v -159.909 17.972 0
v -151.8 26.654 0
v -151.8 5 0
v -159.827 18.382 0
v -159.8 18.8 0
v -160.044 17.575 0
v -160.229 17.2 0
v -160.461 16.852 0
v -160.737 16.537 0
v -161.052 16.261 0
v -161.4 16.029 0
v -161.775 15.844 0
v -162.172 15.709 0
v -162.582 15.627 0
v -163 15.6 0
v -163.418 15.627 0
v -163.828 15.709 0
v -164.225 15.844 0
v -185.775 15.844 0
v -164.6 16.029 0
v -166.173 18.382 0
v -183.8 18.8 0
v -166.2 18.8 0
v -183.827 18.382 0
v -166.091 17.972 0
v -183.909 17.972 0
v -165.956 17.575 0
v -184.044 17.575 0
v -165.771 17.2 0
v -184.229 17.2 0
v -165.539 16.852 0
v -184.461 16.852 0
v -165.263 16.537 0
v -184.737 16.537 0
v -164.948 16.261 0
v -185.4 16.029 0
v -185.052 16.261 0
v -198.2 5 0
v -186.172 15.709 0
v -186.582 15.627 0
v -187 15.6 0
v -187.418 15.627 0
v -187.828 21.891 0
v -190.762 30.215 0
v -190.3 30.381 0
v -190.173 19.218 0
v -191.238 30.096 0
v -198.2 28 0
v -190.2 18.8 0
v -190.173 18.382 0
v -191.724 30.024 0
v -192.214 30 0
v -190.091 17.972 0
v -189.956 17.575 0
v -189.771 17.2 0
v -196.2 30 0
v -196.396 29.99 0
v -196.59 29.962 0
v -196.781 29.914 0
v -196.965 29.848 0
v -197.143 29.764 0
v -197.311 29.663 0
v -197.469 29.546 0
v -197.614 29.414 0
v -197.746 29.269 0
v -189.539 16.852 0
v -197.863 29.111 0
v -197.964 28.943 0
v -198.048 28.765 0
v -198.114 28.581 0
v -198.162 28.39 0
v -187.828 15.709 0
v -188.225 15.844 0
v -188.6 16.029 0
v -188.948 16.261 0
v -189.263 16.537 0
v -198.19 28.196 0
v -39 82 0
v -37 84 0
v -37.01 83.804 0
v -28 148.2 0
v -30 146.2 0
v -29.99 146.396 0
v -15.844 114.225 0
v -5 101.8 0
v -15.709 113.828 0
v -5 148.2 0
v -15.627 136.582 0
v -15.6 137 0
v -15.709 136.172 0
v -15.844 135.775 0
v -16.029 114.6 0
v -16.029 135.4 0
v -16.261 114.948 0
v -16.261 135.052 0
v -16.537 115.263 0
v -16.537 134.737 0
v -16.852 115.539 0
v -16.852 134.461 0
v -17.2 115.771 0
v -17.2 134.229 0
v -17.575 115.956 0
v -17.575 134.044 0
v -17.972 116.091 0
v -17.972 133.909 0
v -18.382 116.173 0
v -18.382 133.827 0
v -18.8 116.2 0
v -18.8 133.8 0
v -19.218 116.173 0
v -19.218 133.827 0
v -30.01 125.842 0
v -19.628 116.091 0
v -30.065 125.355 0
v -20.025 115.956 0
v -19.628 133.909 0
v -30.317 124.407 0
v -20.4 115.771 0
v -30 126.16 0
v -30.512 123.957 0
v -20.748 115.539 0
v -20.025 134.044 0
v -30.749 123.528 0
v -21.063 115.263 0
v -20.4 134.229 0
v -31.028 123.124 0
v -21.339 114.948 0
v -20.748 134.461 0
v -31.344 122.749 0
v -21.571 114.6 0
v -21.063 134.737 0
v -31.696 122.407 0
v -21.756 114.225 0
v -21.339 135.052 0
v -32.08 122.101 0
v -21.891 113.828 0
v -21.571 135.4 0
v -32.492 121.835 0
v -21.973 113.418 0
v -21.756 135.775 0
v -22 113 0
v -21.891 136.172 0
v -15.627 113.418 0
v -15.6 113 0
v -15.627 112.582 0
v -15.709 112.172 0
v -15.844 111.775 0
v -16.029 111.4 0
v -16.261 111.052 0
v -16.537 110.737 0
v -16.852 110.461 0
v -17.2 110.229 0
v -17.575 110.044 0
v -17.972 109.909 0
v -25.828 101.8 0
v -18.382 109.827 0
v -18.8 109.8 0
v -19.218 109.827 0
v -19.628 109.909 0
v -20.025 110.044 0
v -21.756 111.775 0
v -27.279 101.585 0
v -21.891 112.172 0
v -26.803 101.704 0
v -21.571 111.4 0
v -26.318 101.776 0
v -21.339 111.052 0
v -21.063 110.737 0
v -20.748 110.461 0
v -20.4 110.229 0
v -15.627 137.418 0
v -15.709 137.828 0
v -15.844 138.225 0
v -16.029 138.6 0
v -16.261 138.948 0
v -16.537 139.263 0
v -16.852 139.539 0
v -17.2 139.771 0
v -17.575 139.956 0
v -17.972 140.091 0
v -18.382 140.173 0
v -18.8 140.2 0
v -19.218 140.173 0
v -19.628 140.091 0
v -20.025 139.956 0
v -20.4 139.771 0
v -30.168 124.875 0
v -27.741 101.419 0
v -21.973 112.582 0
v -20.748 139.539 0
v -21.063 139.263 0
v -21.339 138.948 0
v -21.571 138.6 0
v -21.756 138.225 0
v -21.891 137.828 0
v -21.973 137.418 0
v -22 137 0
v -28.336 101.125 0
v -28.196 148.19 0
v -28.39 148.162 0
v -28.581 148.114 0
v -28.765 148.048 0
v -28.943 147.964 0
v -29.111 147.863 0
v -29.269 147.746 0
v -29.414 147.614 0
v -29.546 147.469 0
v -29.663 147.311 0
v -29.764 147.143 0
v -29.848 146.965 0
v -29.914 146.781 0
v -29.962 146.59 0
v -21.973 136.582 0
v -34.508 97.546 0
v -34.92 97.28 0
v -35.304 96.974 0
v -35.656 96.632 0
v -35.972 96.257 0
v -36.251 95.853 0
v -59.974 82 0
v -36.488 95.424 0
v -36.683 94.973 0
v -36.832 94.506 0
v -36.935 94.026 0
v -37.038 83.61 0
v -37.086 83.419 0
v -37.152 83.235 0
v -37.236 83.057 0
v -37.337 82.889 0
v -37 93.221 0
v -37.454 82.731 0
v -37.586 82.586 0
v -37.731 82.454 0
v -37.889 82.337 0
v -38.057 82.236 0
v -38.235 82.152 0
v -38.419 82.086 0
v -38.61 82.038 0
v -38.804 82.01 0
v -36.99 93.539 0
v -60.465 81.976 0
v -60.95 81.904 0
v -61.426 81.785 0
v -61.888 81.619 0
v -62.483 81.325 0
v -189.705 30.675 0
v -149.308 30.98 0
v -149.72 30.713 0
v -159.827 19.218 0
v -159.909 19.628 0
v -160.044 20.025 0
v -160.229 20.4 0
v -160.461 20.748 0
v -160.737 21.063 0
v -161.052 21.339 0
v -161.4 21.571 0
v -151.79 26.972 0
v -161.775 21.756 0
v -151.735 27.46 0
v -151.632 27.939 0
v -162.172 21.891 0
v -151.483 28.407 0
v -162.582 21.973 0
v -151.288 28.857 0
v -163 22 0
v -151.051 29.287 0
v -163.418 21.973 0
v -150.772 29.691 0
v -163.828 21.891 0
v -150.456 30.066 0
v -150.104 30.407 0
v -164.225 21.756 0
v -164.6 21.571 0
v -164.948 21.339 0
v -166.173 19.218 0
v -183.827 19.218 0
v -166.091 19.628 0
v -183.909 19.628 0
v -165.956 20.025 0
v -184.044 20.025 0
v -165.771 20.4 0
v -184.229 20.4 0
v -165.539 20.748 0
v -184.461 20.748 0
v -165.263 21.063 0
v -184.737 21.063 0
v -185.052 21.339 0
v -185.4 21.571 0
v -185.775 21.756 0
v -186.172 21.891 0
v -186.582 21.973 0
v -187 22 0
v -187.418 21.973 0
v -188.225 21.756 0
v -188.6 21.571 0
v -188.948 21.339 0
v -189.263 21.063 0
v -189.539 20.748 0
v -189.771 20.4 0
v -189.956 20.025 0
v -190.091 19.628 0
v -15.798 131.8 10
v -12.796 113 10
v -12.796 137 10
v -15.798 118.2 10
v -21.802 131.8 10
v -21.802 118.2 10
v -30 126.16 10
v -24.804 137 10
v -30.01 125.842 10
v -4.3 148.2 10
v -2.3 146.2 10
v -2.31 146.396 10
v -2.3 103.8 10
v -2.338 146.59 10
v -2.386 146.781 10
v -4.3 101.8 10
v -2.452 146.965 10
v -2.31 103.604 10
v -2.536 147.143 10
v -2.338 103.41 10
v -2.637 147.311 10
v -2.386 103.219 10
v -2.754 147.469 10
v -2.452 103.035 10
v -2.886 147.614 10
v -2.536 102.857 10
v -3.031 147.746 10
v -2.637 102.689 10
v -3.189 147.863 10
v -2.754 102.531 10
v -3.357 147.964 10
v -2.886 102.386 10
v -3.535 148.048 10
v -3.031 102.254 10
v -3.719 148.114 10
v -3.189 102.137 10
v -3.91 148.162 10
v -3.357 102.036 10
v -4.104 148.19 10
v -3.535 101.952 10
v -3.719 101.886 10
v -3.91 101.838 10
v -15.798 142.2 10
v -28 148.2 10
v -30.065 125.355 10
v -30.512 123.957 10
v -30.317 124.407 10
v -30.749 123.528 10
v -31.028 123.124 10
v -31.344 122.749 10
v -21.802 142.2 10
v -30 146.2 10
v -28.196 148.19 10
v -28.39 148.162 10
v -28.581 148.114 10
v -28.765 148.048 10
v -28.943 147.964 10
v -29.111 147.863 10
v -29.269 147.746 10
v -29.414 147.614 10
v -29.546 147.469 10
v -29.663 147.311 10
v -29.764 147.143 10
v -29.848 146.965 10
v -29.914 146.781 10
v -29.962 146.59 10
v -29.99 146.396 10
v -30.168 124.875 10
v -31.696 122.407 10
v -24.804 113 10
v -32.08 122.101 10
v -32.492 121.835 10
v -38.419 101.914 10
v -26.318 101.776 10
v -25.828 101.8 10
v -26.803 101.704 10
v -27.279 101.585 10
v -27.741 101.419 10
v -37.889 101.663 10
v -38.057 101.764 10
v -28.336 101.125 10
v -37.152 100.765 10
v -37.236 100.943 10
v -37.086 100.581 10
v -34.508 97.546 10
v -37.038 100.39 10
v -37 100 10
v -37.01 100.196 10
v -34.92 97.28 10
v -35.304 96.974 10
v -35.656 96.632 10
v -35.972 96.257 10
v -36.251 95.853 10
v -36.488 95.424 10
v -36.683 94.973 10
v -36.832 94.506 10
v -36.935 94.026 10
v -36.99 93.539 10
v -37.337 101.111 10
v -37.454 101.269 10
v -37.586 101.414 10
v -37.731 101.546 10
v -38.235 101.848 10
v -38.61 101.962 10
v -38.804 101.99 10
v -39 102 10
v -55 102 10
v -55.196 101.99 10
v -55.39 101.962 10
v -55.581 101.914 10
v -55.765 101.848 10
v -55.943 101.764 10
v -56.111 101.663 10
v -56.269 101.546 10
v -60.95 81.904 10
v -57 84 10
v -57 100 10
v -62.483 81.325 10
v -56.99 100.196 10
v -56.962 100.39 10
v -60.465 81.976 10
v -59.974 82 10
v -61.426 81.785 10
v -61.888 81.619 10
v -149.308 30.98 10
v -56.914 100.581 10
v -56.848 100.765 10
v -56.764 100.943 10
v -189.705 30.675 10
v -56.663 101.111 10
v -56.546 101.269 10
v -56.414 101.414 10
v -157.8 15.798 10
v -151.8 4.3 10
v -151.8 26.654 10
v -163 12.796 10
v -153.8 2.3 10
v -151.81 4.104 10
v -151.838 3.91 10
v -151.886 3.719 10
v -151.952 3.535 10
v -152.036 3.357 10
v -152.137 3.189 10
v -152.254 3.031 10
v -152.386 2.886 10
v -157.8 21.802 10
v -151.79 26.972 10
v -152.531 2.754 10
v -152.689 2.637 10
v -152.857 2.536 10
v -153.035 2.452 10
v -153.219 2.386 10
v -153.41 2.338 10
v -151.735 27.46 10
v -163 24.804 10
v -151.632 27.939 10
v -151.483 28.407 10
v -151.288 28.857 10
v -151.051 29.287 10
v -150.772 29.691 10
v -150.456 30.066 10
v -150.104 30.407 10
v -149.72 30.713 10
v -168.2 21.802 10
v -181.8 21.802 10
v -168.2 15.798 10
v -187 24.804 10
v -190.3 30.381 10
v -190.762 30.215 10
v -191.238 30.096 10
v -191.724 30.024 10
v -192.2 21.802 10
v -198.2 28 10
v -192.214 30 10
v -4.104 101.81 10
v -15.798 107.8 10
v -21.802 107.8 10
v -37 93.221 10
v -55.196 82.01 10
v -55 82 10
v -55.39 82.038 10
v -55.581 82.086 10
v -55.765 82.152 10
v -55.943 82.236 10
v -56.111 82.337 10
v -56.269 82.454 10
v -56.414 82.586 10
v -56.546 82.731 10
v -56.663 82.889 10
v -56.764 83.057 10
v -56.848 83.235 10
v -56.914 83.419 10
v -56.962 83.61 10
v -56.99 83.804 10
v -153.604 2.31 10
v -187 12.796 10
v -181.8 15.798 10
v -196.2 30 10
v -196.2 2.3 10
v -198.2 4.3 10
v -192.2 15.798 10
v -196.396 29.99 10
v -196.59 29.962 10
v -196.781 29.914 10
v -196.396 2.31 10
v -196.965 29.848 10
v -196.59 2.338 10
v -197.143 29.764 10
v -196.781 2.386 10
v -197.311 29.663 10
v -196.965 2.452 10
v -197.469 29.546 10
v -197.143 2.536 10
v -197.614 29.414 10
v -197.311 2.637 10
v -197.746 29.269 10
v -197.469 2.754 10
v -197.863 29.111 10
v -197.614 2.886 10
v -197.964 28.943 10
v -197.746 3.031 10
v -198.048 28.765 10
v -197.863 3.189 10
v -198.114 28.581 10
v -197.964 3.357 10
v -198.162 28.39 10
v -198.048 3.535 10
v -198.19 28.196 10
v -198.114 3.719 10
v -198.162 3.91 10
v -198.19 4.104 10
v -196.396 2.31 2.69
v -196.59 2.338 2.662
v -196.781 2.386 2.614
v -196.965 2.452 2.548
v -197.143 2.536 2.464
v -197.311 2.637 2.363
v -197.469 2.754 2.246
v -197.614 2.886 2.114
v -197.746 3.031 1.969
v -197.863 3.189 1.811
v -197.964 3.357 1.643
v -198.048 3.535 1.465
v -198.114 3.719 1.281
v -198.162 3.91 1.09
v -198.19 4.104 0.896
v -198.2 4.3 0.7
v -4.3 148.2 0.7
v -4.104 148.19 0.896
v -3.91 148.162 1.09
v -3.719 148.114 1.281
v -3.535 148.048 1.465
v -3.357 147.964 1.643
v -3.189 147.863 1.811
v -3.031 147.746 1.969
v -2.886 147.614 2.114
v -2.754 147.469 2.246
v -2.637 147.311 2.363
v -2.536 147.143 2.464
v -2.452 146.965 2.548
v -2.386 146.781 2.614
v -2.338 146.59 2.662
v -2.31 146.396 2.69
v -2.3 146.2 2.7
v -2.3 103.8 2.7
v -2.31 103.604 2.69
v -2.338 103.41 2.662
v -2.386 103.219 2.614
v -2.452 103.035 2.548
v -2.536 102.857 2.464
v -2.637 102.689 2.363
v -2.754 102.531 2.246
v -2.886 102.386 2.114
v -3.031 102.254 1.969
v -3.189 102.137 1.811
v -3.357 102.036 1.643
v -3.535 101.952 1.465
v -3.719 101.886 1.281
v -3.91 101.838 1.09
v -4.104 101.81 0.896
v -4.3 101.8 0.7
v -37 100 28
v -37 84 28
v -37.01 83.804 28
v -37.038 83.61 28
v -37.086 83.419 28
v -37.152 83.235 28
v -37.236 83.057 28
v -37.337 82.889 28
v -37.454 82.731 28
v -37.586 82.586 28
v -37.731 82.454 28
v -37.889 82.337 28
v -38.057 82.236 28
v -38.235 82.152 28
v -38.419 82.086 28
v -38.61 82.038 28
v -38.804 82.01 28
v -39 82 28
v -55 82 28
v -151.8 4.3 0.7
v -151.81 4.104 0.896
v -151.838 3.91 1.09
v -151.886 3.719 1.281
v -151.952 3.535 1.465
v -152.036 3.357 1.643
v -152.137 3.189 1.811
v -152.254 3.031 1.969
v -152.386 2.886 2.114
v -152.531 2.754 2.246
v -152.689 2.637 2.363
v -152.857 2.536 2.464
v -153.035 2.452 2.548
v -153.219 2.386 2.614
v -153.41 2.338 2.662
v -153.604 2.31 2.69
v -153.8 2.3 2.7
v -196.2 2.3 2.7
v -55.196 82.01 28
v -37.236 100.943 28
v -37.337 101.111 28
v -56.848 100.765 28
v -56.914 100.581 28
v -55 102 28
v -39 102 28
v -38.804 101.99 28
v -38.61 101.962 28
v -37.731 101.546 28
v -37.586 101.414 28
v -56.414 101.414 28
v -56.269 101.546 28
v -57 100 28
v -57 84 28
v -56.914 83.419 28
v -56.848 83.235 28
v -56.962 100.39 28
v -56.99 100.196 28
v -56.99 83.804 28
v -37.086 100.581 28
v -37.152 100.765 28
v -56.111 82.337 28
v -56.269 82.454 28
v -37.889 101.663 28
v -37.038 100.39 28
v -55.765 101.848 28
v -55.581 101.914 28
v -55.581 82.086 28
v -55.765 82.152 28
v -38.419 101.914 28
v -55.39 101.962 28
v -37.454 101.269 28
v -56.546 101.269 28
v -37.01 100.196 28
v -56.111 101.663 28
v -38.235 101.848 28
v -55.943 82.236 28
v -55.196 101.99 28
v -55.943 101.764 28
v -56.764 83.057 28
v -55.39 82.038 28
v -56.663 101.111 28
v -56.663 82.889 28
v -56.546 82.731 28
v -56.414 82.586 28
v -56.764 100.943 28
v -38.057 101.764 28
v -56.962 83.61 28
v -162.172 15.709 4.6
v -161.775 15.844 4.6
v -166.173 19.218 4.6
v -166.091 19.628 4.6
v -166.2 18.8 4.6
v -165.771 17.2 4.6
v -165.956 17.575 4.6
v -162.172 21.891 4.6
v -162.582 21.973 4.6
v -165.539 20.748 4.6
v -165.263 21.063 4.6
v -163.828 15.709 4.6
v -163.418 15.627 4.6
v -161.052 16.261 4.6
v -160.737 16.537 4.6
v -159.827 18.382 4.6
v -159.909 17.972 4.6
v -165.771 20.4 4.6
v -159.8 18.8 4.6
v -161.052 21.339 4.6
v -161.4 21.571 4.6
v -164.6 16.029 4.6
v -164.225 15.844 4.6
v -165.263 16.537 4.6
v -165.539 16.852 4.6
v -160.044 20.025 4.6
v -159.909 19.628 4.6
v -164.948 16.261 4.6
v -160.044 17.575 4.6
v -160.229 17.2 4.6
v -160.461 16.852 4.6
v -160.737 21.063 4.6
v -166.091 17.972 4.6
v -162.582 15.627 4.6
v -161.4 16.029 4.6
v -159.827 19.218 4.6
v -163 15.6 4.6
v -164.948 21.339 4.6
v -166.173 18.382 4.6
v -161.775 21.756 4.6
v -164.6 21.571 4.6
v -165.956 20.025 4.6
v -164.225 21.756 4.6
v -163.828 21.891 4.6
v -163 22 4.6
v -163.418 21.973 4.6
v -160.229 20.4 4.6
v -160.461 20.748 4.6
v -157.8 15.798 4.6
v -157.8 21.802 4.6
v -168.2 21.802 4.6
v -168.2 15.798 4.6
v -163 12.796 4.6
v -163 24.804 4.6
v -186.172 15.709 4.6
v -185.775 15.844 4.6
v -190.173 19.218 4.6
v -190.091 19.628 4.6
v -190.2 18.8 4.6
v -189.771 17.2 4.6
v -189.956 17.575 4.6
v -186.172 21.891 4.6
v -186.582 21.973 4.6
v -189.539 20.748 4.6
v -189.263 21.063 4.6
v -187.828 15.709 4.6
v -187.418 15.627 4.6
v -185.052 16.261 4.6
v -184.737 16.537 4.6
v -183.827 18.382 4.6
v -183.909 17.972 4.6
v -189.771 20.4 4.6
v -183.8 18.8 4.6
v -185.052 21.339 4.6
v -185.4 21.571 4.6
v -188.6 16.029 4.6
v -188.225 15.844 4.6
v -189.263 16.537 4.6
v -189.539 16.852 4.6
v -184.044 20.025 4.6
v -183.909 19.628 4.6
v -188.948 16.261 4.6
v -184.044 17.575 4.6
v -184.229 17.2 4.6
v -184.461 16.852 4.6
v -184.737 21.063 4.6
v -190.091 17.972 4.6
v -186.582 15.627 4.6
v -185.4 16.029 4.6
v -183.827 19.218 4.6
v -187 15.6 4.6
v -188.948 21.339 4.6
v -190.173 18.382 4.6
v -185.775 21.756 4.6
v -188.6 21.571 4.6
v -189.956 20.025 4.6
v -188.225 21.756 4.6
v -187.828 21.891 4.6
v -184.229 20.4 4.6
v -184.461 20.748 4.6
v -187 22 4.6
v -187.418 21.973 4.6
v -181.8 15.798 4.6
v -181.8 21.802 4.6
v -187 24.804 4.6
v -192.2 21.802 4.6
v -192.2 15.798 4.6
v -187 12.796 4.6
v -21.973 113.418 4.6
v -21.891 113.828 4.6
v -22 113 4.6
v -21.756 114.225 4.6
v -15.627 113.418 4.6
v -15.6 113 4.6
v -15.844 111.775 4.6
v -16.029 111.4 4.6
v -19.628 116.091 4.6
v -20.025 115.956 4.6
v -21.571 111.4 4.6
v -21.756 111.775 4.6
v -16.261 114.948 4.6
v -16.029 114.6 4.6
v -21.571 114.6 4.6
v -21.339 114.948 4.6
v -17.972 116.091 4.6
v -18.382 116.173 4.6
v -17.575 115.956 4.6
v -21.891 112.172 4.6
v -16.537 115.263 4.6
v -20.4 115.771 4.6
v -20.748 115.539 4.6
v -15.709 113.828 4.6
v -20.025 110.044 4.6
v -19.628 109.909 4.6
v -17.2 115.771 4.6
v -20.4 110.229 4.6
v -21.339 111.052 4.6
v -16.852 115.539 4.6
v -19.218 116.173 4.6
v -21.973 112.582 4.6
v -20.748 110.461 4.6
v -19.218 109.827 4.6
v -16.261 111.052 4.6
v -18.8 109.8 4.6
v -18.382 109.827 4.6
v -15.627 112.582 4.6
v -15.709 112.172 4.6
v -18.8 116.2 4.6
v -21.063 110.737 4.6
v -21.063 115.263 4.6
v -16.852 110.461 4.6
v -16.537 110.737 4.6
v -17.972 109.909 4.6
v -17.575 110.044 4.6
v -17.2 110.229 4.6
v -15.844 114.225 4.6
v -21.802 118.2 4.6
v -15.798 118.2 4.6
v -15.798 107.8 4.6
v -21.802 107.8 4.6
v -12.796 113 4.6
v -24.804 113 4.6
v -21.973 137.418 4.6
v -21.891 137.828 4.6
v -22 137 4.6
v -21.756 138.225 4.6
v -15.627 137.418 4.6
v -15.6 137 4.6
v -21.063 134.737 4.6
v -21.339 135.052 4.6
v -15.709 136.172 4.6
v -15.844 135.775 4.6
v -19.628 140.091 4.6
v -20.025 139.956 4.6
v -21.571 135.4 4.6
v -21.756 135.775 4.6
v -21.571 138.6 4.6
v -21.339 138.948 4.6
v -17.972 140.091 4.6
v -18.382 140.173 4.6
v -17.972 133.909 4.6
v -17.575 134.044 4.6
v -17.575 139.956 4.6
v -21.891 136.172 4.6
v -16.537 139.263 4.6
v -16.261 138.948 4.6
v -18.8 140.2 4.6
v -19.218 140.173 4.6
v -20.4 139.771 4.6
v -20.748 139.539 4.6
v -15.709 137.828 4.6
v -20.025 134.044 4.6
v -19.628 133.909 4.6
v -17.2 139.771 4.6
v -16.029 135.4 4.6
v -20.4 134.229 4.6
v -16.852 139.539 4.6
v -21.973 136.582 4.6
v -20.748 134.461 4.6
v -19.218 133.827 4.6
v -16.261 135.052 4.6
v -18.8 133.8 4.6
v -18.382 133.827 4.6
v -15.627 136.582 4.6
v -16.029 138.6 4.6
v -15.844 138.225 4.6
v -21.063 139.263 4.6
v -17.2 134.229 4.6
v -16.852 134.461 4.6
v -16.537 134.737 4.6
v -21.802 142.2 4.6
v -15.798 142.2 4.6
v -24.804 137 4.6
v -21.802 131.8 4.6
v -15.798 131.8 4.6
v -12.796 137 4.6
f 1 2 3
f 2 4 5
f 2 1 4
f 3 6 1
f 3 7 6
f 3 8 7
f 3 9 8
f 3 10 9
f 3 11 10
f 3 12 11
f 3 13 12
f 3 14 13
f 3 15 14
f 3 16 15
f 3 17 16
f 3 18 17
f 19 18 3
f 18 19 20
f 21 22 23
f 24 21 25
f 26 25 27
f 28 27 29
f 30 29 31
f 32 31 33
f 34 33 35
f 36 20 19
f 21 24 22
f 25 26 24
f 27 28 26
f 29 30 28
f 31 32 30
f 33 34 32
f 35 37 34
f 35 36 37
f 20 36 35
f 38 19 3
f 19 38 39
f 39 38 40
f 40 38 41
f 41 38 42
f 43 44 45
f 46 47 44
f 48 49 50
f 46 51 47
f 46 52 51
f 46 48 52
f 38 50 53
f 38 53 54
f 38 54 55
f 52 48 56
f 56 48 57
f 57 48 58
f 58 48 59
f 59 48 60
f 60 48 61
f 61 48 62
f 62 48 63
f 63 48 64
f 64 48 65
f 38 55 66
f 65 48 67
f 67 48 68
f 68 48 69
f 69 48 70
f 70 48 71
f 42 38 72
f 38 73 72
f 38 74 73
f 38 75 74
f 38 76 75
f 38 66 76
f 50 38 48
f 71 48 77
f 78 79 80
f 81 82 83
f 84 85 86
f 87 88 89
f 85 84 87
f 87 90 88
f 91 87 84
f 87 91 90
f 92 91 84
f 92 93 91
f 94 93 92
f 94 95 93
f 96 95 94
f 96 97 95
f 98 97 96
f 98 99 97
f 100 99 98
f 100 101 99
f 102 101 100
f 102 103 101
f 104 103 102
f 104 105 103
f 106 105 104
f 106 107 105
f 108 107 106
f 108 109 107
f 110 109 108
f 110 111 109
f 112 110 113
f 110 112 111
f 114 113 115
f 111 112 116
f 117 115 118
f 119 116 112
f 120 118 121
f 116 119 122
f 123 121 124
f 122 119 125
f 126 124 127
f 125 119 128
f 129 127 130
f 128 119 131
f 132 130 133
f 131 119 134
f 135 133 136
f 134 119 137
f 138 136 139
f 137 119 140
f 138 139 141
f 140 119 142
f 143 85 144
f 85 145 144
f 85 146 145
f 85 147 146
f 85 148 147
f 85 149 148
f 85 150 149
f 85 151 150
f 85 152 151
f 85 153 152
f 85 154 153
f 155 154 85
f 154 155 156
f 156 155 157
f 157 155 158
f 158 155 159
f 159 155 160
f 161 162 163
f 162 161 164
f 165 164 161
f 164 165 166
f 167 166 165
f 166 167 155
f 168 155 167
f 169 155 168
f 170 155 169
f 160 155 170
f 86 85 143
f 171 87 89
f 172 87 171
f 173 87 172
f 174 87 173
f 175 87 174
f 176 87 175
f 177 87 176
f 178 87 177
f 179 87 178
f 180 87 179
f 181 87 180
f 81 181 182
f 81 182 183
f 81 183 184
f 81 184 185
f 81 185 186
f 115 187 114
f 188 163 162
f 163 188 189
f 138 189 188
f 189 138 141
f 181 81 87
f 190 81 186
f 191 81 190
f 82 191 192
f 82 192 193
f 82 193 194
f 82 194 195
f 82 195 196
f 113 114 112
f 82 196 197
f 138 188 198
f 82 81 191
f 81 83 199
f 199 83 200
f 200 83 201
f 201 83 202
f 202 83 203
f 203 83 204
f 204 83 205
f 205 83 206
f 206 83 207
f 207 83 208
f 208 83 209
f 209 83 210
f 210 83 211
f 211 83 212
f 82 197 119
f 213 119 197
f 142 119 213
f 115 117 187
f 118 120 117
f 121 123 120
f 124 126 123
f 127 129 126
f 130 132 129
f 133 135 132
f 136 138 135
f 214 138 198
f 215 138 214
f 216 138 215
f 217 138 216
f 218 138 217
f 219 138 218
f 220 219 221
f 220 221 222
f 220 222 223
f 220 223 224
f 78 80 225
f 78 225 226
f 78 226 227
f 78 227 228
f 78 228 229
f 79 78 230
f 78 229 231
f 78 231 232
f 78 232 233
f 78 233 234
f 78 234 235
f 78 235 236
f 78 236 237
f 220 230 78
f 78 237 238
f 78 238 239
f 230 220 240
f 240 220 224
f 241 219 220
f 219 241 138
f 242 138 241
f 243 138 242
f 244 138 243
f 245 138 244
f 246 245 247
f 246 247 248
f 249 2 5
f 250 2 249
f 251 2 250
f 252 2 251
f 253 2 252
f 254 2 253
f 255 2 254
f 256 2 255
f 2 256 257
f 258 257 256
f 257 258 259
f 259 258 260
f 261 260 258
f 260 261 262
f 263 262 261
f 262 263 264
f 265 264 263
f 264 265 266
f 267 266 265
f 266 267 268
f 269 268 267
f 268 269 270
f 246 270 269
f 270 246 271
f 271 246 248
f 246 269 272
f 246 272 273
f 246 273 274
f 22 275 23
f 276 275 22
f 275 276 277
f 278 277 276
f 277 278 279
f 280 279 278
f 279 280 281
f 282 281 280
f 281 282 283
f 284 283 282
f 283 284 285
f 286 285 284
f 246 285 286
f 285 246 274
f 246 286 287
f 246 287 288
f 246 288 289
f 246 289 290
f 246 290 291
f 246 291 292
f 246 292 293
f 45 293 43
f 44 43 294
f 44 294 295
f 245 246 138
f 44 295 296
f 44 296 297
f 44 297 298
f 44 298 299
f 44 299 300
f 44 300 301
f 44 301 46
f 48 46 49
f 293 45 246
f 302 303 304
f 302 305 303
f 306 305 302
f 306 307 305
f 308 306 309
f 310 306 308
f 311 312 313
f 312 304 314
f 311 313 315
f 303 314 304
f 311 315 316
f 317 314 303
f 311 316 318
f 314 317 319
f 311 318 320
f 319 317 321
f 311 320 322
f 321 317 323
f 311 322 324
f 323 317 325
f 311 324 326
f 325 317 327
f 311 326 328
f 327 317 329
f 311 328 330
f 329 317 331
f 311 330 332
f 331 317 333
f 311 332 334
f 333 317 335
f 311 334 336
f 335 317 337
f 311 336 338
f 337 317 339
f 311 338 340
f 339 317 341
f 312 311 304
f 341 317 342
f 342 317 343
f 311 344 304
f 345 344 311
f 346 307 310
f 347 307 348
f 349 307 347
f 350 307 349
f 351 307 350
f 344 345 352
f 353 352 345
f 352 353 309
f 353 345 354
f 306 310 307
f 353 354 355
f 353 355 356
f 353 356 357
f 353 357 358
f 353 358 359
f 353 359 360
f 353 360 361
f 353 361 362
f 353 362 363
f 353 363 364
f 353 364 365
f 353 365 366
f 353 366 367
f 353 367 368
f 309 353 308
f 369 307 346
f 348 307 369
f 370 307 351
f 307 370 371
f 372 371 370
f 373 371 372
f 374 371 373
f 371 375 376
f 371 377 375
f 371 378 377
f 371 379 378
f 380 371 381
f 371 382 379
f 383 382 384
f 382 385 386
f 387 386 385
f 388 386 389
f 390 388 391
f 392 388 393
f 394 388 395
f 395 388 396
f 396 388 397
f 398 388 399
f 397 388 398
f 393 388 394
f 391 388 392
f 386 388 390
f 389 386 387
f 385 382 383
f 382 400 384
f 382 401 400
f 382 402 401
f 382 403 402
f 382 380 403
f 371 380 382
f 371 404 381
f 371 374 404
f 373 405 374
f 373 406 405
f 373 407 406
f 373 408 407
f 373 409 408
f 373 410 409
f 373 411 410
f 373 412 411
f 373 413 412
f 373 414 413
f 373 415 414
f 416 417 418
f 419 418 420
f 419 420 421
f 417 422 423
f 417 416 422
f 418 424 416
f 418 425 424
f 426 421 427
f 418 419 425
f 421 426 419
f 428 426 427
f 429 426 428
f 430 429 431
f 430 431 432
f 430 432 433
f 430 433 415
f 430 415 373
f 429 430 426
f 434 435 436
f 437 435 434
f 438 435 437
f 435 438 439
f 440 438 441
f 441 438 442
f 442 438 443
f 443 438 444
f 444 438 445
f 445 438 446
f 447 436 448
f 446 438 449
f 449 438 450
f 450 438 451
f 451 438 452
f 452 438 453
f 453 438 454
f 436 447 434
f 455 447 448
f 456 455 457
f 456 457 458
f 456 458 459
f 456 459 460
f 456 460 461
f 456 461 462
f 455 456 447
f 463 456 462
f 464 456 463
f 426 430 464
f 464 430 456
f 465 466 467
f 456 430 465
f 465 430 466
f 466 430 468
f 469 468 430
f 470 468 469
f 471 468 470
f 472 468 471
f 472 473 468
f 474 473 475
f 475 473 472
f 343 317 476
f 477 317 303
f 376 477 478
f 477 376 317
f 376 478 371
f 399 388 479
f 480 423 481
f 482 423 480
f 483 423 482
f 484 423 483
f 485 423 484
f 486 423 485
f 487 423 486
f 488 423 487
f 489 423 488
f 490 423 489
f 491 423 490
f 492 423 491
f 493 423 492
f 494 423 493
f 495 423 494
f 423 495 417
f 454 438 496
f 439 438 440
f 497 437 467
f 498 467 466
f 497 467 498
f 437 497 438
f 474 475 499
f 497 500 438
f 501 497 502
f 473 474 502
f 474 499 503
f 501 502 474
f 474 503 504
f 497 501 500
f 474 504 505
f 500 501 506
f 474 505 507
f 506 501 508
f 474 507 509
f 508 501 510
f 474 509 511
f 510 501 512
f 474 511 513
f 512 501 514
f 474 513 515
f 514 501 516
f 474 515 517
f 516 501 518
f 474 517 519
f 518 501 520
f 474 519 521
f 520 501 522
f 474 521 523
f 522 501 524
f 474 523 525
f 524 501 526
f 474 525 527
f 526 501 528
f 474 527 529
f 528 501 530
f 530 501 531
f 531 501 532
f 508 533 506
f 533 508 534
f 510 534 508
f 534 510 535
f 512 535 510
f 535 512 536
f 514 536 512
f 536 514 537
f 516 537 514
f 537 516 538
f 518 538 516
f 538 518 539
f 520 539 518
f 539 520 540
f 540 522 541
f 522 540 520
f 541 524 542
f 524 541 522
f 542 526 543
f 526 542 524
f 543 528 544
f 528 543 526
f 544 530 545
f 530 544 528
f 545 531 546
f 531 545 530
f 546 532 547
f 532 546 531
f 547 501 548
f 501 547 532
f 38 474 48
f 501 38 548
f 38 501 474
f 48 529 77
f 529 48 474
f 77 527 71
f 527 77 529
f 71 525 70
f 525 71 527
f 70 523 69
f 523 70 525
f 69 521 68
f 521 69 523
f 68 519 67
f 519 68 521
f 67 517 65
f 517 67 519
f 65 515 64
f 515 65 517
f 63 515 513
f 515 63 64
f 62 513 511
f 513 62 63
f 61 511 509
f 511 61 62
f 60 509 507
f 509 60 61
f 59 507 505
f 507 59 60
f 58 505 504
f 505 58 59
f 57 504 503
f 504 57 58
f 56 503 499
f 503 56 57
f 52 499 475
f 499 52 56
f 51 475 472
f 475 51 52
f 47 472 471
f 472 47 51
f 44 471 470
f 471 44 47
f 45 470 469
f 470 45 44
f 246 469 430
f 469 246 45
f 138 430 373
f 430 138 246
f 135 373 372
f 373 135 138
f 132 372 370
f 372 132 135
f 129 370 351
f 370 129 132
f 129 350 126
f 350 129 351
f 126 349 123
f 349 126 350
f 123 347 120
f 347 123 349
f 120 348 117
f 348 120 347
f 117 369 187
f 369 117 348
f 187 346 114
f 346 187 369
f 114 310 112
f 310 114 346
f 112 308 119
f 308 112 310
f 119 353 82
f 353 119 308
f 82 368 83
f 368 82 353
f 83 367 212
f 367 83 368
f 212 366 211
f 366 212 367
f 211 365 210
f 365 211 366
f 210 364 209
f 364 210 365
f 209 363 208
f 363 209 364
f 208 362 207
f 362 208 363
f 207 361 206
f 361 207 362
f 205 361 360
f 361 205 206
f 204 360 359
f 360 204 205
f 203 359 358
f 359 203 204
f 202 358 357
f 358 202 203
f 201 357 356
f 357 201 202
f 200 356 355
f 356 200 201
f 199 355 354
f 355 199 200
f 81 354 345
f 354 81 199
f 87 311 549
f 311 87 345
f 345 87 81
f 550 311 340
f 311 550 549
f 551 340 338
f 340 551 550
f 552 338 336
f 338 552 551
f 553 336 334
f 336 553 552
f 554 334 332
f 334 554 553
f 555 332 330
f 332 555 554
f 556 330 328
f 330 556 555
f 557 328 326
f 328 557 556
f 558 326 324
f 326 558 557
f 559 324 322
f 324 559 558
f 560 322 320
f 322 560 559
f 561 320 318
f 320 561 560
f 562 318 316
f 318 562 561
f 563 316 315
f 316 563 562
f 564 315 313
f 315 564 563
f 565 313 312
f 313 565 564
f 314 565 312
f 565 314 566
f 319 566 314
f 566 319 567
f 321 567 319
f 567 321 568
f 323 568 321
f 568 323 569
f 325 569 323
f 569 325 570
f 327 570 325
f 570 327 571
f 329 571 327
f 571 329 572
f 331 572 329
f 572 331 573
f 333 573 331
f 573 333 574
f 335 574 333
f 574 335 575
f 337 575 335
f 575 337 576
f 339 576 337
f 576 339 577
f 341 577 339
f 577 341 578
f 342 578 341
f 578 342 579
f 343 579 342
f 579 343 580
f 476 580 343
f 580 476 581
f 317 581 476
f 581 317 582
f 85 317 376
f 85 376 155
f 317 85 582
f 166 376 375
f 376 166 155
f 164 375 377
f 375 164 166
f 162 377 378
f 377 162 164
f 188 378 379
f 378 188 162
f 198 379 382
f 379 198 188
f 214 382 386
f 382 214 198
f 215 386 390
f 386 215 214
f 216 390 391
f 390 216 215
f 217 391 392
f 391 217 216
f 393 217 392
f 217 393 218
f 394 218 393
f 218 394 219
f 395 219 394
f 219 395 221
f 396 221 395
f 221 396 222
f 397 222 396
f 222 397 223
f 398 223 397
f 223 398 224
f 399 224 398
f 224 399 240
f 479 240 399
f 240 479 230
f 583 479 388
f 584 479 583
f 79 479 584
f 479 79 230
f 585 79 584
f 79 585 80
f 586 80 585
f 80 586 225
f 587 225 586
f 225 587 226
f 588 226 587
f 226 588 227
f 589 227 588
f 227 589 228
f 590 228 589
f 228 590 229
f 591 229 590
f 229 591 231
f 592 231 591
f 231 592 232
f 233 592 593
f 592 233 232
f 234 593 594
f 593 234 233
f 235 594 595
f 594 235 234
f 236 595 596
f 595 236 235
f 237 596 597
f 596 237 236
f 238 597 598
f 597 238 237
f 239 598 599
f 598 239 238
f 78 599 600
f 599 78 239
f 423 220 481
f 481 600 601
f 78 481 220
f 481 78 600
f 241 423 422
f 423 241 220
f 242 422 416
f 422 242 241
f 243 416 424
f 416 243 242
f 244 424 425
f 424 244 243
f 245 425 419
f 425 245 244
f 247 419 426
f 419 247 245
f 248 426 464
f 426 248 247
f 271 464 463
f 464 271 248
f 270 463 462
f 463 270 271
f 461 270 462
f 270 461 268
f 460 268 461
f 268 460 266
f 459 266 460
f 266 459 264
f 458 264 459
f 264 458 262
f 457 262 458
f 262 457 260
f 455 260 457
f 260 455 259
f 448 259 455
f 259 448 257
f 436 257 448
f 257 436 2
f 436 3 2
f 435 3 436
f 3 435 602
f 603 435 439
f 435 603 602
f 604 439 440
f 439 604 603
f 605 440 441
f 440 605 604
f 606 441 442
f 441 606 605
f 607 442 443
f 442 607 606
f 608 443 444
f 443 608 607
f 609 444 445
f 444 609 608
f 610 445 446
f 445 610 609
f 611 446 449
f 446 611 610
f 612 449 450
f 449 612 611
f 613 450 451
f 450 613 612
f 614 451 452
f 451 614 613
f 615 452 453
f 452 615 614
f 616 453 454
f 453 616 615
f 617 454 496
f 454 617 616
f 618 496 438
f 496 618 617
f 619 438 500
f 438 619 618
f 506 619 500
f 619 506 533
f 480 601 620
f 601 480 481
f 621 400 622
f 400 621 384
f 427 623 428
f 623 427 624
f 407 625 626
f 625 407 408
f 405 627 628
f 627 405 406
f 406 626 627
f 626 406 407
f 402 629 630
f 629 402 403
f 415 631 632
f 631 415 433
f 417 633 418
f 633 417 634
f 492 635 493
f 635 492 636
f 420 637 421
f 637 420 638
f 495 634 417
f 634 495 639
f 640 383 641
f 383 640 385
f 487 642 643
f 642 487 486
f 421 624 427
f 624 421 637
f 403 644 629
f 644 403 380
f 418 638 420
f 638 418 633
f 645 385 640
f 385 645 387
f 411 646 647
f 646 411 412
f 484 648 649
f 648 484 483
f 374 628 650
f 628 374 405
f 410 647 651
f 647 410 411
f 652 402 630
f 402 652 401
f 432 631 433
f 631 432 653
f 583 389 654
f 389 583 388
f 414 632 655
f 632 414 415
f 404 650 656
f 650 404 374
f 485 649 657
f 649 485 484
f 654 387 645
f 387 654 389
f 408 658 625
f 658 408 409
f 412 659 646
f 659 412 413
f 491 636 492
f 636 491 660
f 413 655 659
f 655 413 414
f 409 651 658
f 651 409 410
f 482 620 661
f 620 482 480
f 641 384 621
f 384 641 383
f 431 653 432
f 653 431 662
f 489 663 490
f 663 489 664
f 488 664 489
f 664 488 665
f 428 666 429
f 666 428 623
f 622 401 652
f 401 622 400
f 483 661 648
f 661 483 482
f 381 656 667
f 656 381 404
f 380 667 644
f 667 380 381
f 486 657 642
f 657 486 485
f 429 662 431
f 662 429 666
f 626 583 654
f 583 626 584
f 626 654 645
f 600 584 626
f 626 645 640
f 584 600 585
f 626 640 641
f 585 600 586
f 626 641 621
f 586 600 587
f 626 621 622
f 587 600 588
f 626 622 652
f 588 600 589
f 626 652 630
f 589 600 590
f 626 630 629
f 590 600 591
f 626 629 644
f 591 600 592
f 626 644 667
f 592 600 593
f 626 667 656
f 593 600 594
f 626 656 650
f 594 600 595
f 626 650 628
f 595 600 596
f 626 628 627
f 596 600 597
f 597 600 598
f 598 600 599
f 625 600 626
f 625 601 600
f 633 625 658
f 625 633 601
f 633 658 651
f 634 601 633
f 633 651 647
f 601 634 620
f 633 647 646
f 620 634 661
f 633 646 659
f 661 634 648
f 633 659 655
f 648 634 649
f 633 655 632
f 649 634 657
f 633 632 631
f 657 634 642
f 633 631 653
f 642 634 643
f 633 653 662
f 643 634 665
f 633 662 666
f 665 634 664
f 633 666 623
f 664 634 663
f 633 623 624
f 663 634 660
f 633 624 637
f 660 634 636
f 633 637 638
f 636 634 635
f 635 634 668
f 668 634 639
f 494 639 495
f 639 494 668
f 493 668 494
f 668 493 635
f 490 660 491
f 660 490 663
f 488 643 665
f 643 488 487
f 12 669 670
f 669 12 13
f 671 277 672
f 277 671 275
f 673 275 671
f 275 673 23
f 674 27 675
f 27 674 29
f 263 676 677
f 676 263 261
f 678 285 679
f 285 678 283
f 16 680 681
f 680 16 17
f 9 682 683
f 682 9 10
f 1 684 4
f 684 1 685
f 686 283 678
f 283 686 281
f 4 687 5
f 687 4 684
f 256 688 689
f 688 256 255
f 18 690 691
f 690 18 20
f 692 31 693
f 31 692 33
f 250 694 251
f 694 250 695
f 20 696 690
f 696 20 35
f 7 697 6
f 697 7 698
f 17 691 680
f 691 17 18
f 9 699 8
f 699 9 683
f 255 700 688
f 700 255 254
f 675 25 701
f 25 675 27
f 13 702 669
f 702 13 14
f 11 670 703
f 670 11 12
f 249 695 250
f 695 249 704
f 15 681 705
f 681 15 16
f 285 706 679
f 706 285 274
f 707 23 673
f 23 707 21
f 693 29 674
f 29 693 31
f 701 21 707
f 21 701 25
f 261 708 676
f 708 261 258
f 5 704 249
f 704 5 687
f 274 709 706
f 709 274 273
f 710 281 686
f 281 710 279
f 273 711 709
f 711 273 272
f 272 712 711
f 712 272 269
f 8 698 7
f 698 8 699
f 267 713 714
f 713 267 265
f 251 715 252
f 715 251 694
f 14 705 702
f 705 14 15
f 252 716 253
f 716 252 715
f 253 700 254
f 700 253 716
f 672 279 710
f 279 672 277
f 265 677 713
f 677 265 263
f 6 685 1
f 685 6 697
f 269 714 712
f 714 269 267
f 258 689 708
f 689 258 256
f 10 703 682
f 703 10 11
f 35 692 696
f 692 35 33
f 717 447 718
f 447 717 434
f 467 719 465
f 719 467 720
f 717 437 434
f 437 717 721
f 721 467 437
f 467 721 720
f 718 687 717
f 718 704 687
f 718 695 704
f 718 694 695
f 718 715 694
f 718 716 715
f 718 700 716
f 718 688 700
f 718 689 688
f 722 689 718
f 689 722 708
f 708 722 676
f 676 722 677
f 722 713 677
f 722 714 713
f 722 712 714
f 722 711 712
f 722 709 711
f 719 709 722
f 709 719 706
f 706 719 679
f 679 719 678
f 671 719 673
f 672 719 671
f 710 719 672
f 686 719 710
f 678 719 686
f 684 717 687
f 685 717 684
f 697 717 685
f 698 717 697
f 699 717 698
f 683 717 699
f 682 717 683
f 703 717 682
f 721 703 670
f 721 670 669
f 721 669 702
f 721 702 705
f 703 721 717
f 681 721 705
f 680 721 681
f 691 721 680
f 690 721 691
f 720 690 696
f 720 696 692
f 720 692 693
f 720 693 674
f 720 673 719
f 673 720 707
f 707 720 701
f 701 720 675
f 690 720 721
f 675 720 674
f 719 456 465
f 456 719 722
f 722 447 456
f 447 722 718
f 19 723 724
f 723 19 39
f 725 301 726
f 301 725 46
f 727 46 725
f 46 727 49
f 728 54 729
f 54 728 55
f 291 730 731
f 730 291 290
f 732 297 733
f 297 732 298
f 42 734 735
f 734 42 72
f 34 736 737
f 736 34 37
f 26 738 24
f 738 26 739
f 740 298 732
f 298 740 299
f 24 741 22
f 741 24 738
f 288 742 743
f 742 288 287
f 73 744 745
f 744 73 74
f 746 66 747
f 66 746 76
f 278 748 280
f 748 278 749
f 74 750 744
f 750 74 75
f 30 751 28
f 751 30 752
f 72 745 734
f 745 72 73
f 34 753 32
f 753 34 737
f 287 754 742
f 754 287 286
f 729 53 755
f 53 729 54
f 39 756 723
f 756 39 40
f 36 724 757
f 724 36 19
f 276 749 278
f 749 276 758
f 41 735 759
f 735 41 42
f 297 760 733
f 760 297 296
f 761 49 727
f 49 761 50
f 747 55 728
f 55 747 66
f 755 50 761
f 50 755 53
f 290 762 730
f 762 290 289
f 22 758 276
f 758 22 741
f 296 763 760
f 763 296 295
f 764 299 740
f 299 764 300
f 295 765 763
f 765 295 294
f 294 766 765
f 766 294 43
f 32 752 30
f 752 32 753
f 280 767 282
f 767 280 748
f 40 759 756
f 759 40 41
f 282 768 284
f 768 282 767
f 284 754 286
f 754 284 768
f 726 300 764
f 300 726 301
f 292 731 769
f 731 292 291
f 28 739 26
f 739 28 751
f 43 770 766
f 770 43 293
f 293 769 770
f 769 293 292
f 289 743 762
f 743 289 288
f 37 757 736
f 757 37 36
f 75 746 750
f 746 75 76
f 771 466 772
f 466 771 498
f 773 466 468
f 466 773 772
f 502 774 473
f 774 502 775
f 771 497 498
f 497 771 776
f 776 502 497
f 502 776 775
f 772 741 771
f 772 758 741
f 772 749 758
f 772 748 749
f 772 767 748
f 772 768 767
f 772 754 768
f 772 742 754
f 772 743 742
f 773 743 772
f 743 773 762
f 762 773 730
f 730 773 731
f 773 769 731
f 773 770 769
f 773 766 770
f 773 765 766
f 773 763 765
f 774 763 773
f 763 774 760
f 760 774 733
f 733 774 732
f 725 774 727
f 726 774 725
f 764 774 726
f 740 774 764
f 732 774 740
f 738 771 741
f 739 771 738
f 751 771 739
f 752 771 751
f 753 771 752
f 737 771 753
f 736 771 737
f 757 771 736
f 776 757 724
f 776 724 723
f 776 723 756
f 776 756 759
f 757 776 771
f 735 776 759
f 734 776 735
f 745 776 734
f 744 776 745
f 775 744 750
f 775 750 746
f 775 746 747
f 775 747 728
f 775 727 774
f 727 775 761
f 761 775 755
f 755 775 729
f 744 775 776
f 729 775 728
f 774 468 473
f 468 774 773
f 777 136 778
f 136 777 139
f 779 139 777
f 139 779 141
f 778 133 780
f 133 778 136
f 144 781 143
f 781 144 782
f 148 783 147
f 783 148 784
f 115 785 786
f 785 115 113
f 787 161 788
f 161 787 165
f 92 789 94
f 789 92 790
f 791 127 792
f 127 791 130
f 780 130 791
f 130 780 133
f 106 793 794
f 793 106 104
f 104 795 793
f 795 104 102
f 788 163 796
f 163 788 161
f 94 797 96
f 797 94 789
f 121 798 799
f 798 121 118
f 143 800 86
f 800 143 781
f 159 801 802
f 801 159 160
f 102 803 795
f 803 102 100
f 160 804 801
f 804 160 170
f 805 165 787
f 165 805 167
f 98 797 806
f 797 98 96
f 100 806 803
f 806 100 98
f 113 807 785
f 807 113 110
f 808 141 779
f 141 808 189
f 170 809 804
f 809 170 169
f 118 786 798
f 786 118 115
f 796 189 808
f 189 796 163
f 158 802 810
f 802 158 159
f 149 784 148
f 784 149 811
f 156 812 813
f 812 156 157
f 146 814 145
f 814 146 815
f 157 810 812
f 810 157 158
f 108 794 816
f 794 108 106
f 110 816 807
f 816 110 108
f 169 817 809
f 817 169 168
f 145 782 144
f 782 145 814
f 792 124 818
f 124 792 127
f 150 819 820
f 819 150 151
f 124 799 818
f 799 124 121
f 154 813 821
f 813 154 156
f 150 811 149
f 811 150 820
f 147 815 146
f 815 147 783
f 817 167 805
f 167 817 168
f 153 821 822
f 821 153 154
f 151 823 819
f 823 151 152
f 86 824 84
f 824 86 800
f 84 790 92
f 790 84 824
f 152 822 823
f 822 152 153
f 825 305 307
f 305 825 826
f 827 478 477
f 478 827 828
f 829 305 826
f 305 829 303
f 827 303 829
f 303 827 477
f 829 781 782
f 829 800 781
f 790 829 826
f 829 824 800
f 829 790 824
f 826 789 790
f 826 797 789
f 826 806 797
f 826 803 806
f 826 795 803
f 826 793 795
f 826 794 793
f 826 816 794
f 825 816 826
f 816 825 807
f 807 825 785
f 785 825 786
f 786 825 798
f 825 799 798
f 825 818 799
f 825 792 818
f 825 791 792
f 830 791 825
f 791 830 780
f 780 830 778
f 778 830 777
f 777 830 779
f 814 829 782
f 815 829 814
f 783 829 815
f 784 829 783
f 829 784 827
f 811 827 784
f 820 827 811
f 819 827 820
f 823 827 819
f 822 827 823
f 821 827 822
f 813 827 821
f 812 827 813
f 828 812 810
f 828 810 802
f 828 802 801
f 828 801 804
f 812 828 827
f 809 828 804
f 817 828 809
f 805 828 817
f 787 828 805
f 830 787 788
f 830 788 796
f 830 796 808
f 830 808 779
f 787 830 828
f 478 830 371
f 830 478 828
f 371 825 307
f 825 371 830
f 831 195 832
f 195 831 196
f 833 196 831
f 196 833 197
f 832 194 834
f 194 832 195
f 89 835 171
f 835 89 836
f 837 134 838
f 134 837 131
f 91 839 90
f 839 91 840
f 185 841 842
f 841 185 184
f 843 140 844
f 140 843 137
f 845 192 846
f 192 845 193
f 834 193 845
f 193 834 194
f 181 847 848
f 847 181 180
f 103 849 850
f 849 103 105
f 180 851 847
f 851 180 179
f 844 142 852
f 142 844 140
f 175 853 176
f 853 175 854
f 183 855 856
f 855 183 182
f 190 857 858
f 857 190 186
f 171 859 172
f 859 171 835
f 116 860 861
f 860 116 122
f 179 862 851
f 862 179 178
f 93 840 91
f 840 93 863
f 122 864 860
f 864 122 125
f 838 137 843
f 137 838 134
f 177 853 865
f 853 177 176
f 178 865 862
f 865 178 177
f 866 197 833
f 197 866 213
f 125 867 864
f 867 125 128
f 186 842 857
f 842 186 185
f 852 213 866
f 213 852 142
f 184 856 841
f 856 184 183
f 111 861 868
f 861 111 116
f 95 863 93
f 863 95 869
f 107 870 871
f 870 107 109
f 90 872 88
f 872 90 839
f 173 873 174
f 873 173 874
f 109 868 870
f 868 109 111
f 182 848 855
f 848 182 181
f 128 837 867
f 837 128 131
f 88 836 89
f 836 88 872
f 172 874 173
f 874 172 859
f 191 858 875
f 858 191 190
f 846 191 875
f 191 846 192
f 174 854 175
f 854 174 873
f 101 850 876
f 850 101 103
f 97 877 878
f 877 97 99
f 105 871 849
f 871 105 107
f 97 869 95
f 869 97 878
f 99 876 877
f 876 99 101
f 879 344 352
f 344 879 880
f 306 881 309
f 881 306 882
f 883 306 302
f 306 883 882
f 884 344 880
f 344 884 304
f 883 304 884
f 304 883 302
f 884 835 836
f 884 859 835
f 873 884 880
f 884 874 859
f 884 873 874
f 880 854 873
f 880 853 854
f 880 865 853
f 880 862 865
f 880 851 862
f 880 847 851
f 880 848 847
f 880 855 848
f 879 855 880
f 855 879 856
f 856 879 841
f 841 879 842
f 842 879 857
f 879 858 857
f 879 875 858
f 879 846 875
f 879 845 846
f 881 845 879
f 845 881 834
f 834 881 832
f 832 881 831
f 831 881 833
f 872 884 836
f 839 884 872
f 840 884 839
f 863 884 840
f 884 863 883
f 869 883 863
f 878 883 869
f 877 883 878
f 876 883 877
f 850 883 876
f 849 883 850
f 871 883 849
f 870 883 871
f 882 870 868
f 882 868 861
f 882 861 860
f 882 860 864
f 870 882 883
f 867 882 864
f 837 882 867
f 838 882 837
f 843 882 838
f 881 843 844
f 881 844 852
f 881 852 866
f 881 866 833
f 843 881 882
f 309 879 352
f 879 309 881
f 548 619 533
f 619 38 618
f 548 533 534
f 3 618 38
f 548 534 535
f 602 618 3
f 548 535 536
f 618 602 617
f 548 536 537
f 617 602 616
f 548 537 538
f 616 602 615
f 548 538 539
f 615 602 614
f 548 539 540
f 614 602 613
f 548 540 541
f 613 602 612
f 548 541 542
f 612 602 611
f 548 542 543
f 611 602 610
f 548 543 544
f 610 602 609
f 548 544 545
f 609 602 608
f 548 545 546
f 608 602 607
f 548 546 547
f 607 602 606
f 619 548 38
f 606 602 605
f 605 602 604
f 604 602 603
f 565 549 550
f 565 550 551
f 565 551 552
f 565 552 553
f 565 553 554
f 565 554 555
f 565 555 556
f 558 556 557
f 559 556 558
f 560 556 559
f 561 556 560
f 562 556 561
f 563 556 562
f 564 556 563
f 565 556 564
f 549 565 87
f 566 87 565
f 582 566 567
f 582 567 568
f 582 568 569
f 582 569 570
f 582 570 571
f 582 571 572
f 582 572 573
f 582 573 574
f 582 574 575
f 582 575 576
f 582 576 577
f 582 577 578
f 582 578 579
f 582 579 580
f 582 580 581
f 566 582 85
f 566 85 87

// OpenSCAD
// file: ../../../../modules/steel_rack.scad
use <bolts.scad>;

bolt_edge_offset = 15;
bolt_positions = [
  bolt_edge_offset,
  bolt_edge_offset + 98,
  bolt_edge_offset + 98 + 24,
];

module bolt_and_nut(y, h) {
  nut_thickness = 5;
  translate([0, y, h / 2])
    m6_bolt_hole(h + 1, center = true);
  translate([0, y, h - nut_thickness / 2])
    rotate([0, 0, 90])
    m6_nut_trap(nut_thickness, center = true);
}

module long_bar(w, y, h) {
  difference() {
    translate([w / 2, y / 2, h / 2])
      cube([w, y, h], center = true);

    for (x = bolt_positions) {
      translate([x, 0, 0])
        bolt_and_nut(y / 2, h);
    }
  }
}

module short_bar(w, y, h) {
  difference() {
    translate([w / 2, y / 2, h / 2])
      cube([w, y, h], center = true);

    translate([bolt_positions[0], 0, 0])
      bolt_and_nut(y / 2, h);
  }
}

module fillet_profile(r, h) {
  linear_extrude(height = h, center = true)
    difference() {
      square([r, r]);
      circle(r = r, $fn = 64);
    }
}
// file: ../../../../modules/slide_rail_outer_bracket.scad
use <bolts.scad>
use <steel_rack.scad>

// スライドレール外側とL字アングルを接合するL字ブラケット。
// 設計の経緯と確定値は ledger/designs/steel-rack-500x400.md が正本。
//
// 座標系 (部品自身の datum):
//   X = 0 がこの部品側のL字アングル外側面。部品はアングル板厚の内側から始まる
//   Y = 0 がスライドレール外側面。+Y がラック外側
//   Z = 0 が部品底面 (レール下端と一致)
// front は screw_x = [37, 101.5]、rear は [79.5, 176] を自分の datum
// から渡す。 M6 が高さ 22.5±12 の対称配置のため部品は Z 反転対称になり、
// 左右のレールにも上下反転するだけで同じ2部品を使い回せる。

bracket_height = 45;
flange_t = 10; // 短辺 (X方向厚) の厚さ
// 長辺 (Y方向厚) の厚さ。旧断面は flange_t=10 を共用していたが、レール面を
// rail_offset 分外へ出すと M6 ナット挿入口が長辺と重なるため 2mm 削った
// (10→8、user決定)。ナット六角の内縁 (y=8.000) と長辺外面がツライチになる
arm_t = 8;
// レール接触面のラック外側オフセット。組付け実測でレール間隔が 385mm しか
// なくケース 412mm が入らないため、(412 - 385) / 2 + 0.5 = 14mm ずつ
// 各レールを外側へ移す (user指示)。M6 実穴は既に開いており位置を変えられない
rail_offset = 14;
inner_r = 4;
m6_z = [ 10.5, 34.5 ];
// クリアランス基準: 呼び寸法 + 0.4mm (実プリントの嵌合結果から拡大)
m6_pass_flat = 6.4; // M6ボルト通し六角の二面幅 (手前5mm)
m6_nut_flat = 10.4; // M6ナット窪み六角の二面幅 (奥5mm、ナット実測9.8 + 実効0.6)
m6_stage_depth = 5;
screw_z = 22.5;
m4_pass_flat = 4.4; // M4小トラスネジ通し六角の二面幅
m4_nut_flat = 7.4; // M4ナット窪み六角の二面幅 (ナット実測6.8 + 実効0.6)
m4_nut_depth = 2.8; // M4ナット窪みの深さ (user指定)
edge_margin = 8; // 穴の外縁から部品端までの余白 (自由な辺のみ)
angle_t = 2.2; // L字アングルの板厚

// 六角プリズム: 軸X・上下の辺が水平 (flat-up)。
// 天井を短い水平ブリッジにして垂れの改善を狙う
// (point-up だと天井面が水平から30°になり垂れた — 嵌合試験で確認済み)
module
hex_x_flat_up(flat_d, l)
{
    rotate([ 0, 90, 0 ]) rotate([ 0, 0, 90 ]) hex_hole(flat_d = flat_d, h = l);
}

// 六角プリズム: 軸Y・上下の辺が水平 (flat-up)。M6と同じくブリッジ天井
module
hex_y_flat_up(flat_d, l)
{
    rotate([ 90, 0, 0 ]) hex_hole(flat_d = flat_d, h = l);
}

module
slide_rail_outer_bracket(screw_x, name = "bracket")
{
    // flat-up配置では水平方向の穴半径は対角/2 (= 二面幅/(2*cos30))。
    // 8mm余白の契約はこの実半径に対して守る
    m6_nut_diag = m6_nut_flat / cos(30);
    m4_nut_diag = m4_nut_flat / cos(30);
    // M6中心: 実物のアングルには旧断面 (長辺厚10) の導出値
    // (厚10 + 内側R + 余白 + M6六角対角/2 = 28.0044) で既に穴が開いている。
    // 旧導出式から rail_offset を引くことで M6 実穴と部品外端の絶対位置を
    // 保ったまま、レール接触面 (y=0) だけをラック外側へ 14mm 出す
    m6_y = flange_t + inner_r + edge_margin + m6_nut_diag / 2 - rail_offset;
    short_len = m6_y + m6_nut_diag / 2 + edge_margin;
    // 長辺のX終端: 最奥のM4穴の最大断面 (ナット窪みの対角の半分) + 余白
    arm_end = max(screw_x) + m4_nut_diag / 2 + edge_margin;

    echo(str("CONTRACT ", name, ": height = ", bracket_height));
    echo(str("CONTRACT ", name, ": flange_t = ", flange_t));
    echo(str("CONTRACT ", name, ": arm_t = ", arm_t));
    echo(str("CONTRACT ", name, ": rail_offset = ", rail_offset));
    echo(str("CONTRACT ", name, ": inner_r = ", inner_r));
    echo(str("CONTRACT ", name, ": m6_z = ", m6_z));
    echo(str("CONTRACT ", name, ": m6_pass_flat = ", m6_pass_flat));
    echo(str("CONTRACT ", name, ": m6_nut_flat = ", m6_nut_flat));
    echo(str("CONTRACT ", name, ": screw_z = ", screw_z));
    echo(str("CONTRACT ", name, ": m4_pass_flat = ", m4_pass_flat));
    echo(str("CONTRACT ", name, ": m4_nut_flat = ", m4_nut_flat));
    echo(str("CONTRACT ", name, ": m4_nut_depth = ", m4_nut_depth));
    echo(str("CONTRACT ", name, ": edge_margin = ", edge_margin));
    echo(str("CONTRACT ", name, ": angle_t = ", angle_t));
    echo(str("CONTRACT ", name, ": screw_x = ", screw_x));
    echo(str("CONTRACT ",
             name,
             ": m6_y = ",
             m6_y,
             ", short_len = ",
             short_len,
             ", arm_end = ",
             arm_end));

    // 余白の契約 (自由な辺のみ。高さ45とM6のZはuser固定値なので対象外)。
    // M6ナット六角の内縁 (m6_y - 対角/2 = 8.000) は長辺外面 (y = arm_t) と
    // ツライチで、ナット挿入口が長辺に塞がれない (1e-9 は浮動小数の丸め猶予)
    assert(m6_y - m6_nut_diag / 2 >= arm_t - 1e-9,
           "M6 nut slot is blocked by the arm");
    assert(short_len - (m6_y + m6_nut_diag / 2) >= edge_margin,
           "M6 hole too close to the short-flange edge");
    assert(arm_end - (max(screw_x) + m4_nut_diag / 2) >= edge_margin,
           "M4 hole too close to the arm end");
    assert(min(screw_x) - m4_nut_diag / 2 >= angle_t + flange_t,
           "M4 hole overlaps the short flange");

    difference()
    {
        union()
        {
            // 短辺: アングル内側に当たる縦板 (M6で締結)
            translate([ angle_t, 0, 0 ])
                cube([ flange_t, short_len, bracket_height ]);

            // 長辺: レール外側面に当たる横板 (M4小トラスネジ+ナットで締結)
            translate([ angle_t, 0, 0 ])
                cube([ arm_end - angle_t, arm_t, bracket_height ]);

            // 内側コーナーのR4フィレット (応力集中の回避)
            translate([
                angle_t + flange_t + inner_r,
                arm_t + inner_r,
                bracket_height / 2
            ]) rotate([ 0, 0, 180 ]) fillet_profile(inner_r, bracket_height);
        }

        // M6の2段六角穴 (軸X・flat-up): 手前5mmが通し、奥5mmがナット窪み。
        // ナット窪みは +X へ延長した挿入回廊 (x=7.2..17): 短辺の背面から
        // fillet の掛かる区間を局所カットし、fillet 外端 (x=16.2) を 0.8mm
        // 超えて開放することで M6 ナットを +X 側から真っ直ぐ挿入できる
        // (fillet と挿入経路の干渉分を削るのは user 許容)。
        // 六角の下頂点 (y=8.000) は長辺外面とツライチで、正確な接触は
        // 退化した稜 (非多様体STL) を作るため、hull で 0.2mm 下へ掃引して
        // 長辺外面に浅い逃げ溝を彫る (ナットの嵌合には影響しない)
        slot_start = angle_t + flange_t - m6_stage_depth;
        slot_end = angle_t + flange_t + inner_r + 0.8;
        slot_relief = 0.2;
        for (z = m6_z) {
            translate([ angle_t + m6_stage_depth / 2 - 0.05, m6_y, z ])
                hex_x_flat_up(m6_pass_flat, m6_stage_depth + 0.1);
            translate([ (slot_start + slot_end) / 2, m6_y, z ]) hull()
            {
                hex_x_flat_up(m6_nut_flat, slot_end - slot_start);
                translate([ 0, -slot_relief, 0 ])
                    hex_x_flat_up(m6_nut_flat, slot_end - slot_start);
            }
        }

        // M4小トラスネジの穴 (軸Y・flat-up):
        // 通しは全厚を貫通し、L字の内側面 (y=8) から深さ2.8mmのナット窪み。
        // ネジはレール内側から刺さり
        // (トラス頭はスライダーと干渉しない実測済み)、
        // ナットが窪みの底で受けてレール板とブラケットを共締めする
        for (x = screw_x) {
            translate([ x, arm_t / 2, screw_z ])
                hex_y_flat_up(m4_pass_flat, arm_t + 0.2);
            translate([ x, arm_t - m4_nut_depth / 2 + 0.05, screw_z ])
                hex_y_flat_up(m4_nut_flat, m4_nut_depth + 0.1);
        }
    }
}
// file: ../../../../modules/bolts.scad
module nut_trap(d, h, center = true) {
  linear_extrude(height = h, center = center)
  circle(d = d / cos(30), $fn = 6);
}

module bolt_hole(d, h, center = true) {
  linear_extrude(height = h, center = center)
  circle(d = d, $fn = 64);
}

// Hex holes for self-tapping (nominal - 0.2mm)
module hex_hole(flat_d, h) {
  linear_extrude(height = h, center = true)
  circle(d = flat_d / cos(30), $fn = 6);
}

module m3_bolt_hexhole(h) {
  rotate([0, 0, 90]) hex_hole(flat_d = 2.8, h = h);
}

module m4_bolt_hexhole(h) {
  rotate([0, 0, 90]) hex_hole(flat_d = 3.8, h = h);
}

module m6_bolt_hexhole(h) {
  rotate([0, 0, 90]) hex_hole(flat_d = 5.8, h = h);
}

module m8_bolt_hexhole(h) {
  rotate([0, 0, 90]) hex_hole(flat_d = 7.8, h = h);
}

// M3
module m3_bolt_hole(h, center = false) { bolt_hole(d = 3.4, h = h, center = center); }
module m3_nut_trap(h, center = false) { nut_trap(d = 5.7, h = h, center = center); }

// M4
module m4_bolt_hole(h, center = false) { bolt_hole(d = 4.4, h = h, center = center); }
module m4_nut_trap(h, center = false) { nut_trap(d = 7.5, h = h, center = center); }

// M6
module m6_bolt_hole(h, center = false) { bolt_hole(d = 6.2, h = h, center = center); }
module m6_nut_trap(h, center = false) { nut_trap(d = 10.2, h = h, center = center); }

// M8
module m8_bolt_hole(h, center = false) { bolt_hole(d = 8.4, h = h, center = center); }
module m8_nut_trap(h, center = false) { nut_trap(d = 13.3, h = h, center = center); }
// main file
use <../../../../modules/shelf_frame.scad>

// ケース棚の筋交い。手前右・奥左用（左用の鏡像）。
shelf_frame_flat_print(mirrored = true) shelf_frame_brace();
